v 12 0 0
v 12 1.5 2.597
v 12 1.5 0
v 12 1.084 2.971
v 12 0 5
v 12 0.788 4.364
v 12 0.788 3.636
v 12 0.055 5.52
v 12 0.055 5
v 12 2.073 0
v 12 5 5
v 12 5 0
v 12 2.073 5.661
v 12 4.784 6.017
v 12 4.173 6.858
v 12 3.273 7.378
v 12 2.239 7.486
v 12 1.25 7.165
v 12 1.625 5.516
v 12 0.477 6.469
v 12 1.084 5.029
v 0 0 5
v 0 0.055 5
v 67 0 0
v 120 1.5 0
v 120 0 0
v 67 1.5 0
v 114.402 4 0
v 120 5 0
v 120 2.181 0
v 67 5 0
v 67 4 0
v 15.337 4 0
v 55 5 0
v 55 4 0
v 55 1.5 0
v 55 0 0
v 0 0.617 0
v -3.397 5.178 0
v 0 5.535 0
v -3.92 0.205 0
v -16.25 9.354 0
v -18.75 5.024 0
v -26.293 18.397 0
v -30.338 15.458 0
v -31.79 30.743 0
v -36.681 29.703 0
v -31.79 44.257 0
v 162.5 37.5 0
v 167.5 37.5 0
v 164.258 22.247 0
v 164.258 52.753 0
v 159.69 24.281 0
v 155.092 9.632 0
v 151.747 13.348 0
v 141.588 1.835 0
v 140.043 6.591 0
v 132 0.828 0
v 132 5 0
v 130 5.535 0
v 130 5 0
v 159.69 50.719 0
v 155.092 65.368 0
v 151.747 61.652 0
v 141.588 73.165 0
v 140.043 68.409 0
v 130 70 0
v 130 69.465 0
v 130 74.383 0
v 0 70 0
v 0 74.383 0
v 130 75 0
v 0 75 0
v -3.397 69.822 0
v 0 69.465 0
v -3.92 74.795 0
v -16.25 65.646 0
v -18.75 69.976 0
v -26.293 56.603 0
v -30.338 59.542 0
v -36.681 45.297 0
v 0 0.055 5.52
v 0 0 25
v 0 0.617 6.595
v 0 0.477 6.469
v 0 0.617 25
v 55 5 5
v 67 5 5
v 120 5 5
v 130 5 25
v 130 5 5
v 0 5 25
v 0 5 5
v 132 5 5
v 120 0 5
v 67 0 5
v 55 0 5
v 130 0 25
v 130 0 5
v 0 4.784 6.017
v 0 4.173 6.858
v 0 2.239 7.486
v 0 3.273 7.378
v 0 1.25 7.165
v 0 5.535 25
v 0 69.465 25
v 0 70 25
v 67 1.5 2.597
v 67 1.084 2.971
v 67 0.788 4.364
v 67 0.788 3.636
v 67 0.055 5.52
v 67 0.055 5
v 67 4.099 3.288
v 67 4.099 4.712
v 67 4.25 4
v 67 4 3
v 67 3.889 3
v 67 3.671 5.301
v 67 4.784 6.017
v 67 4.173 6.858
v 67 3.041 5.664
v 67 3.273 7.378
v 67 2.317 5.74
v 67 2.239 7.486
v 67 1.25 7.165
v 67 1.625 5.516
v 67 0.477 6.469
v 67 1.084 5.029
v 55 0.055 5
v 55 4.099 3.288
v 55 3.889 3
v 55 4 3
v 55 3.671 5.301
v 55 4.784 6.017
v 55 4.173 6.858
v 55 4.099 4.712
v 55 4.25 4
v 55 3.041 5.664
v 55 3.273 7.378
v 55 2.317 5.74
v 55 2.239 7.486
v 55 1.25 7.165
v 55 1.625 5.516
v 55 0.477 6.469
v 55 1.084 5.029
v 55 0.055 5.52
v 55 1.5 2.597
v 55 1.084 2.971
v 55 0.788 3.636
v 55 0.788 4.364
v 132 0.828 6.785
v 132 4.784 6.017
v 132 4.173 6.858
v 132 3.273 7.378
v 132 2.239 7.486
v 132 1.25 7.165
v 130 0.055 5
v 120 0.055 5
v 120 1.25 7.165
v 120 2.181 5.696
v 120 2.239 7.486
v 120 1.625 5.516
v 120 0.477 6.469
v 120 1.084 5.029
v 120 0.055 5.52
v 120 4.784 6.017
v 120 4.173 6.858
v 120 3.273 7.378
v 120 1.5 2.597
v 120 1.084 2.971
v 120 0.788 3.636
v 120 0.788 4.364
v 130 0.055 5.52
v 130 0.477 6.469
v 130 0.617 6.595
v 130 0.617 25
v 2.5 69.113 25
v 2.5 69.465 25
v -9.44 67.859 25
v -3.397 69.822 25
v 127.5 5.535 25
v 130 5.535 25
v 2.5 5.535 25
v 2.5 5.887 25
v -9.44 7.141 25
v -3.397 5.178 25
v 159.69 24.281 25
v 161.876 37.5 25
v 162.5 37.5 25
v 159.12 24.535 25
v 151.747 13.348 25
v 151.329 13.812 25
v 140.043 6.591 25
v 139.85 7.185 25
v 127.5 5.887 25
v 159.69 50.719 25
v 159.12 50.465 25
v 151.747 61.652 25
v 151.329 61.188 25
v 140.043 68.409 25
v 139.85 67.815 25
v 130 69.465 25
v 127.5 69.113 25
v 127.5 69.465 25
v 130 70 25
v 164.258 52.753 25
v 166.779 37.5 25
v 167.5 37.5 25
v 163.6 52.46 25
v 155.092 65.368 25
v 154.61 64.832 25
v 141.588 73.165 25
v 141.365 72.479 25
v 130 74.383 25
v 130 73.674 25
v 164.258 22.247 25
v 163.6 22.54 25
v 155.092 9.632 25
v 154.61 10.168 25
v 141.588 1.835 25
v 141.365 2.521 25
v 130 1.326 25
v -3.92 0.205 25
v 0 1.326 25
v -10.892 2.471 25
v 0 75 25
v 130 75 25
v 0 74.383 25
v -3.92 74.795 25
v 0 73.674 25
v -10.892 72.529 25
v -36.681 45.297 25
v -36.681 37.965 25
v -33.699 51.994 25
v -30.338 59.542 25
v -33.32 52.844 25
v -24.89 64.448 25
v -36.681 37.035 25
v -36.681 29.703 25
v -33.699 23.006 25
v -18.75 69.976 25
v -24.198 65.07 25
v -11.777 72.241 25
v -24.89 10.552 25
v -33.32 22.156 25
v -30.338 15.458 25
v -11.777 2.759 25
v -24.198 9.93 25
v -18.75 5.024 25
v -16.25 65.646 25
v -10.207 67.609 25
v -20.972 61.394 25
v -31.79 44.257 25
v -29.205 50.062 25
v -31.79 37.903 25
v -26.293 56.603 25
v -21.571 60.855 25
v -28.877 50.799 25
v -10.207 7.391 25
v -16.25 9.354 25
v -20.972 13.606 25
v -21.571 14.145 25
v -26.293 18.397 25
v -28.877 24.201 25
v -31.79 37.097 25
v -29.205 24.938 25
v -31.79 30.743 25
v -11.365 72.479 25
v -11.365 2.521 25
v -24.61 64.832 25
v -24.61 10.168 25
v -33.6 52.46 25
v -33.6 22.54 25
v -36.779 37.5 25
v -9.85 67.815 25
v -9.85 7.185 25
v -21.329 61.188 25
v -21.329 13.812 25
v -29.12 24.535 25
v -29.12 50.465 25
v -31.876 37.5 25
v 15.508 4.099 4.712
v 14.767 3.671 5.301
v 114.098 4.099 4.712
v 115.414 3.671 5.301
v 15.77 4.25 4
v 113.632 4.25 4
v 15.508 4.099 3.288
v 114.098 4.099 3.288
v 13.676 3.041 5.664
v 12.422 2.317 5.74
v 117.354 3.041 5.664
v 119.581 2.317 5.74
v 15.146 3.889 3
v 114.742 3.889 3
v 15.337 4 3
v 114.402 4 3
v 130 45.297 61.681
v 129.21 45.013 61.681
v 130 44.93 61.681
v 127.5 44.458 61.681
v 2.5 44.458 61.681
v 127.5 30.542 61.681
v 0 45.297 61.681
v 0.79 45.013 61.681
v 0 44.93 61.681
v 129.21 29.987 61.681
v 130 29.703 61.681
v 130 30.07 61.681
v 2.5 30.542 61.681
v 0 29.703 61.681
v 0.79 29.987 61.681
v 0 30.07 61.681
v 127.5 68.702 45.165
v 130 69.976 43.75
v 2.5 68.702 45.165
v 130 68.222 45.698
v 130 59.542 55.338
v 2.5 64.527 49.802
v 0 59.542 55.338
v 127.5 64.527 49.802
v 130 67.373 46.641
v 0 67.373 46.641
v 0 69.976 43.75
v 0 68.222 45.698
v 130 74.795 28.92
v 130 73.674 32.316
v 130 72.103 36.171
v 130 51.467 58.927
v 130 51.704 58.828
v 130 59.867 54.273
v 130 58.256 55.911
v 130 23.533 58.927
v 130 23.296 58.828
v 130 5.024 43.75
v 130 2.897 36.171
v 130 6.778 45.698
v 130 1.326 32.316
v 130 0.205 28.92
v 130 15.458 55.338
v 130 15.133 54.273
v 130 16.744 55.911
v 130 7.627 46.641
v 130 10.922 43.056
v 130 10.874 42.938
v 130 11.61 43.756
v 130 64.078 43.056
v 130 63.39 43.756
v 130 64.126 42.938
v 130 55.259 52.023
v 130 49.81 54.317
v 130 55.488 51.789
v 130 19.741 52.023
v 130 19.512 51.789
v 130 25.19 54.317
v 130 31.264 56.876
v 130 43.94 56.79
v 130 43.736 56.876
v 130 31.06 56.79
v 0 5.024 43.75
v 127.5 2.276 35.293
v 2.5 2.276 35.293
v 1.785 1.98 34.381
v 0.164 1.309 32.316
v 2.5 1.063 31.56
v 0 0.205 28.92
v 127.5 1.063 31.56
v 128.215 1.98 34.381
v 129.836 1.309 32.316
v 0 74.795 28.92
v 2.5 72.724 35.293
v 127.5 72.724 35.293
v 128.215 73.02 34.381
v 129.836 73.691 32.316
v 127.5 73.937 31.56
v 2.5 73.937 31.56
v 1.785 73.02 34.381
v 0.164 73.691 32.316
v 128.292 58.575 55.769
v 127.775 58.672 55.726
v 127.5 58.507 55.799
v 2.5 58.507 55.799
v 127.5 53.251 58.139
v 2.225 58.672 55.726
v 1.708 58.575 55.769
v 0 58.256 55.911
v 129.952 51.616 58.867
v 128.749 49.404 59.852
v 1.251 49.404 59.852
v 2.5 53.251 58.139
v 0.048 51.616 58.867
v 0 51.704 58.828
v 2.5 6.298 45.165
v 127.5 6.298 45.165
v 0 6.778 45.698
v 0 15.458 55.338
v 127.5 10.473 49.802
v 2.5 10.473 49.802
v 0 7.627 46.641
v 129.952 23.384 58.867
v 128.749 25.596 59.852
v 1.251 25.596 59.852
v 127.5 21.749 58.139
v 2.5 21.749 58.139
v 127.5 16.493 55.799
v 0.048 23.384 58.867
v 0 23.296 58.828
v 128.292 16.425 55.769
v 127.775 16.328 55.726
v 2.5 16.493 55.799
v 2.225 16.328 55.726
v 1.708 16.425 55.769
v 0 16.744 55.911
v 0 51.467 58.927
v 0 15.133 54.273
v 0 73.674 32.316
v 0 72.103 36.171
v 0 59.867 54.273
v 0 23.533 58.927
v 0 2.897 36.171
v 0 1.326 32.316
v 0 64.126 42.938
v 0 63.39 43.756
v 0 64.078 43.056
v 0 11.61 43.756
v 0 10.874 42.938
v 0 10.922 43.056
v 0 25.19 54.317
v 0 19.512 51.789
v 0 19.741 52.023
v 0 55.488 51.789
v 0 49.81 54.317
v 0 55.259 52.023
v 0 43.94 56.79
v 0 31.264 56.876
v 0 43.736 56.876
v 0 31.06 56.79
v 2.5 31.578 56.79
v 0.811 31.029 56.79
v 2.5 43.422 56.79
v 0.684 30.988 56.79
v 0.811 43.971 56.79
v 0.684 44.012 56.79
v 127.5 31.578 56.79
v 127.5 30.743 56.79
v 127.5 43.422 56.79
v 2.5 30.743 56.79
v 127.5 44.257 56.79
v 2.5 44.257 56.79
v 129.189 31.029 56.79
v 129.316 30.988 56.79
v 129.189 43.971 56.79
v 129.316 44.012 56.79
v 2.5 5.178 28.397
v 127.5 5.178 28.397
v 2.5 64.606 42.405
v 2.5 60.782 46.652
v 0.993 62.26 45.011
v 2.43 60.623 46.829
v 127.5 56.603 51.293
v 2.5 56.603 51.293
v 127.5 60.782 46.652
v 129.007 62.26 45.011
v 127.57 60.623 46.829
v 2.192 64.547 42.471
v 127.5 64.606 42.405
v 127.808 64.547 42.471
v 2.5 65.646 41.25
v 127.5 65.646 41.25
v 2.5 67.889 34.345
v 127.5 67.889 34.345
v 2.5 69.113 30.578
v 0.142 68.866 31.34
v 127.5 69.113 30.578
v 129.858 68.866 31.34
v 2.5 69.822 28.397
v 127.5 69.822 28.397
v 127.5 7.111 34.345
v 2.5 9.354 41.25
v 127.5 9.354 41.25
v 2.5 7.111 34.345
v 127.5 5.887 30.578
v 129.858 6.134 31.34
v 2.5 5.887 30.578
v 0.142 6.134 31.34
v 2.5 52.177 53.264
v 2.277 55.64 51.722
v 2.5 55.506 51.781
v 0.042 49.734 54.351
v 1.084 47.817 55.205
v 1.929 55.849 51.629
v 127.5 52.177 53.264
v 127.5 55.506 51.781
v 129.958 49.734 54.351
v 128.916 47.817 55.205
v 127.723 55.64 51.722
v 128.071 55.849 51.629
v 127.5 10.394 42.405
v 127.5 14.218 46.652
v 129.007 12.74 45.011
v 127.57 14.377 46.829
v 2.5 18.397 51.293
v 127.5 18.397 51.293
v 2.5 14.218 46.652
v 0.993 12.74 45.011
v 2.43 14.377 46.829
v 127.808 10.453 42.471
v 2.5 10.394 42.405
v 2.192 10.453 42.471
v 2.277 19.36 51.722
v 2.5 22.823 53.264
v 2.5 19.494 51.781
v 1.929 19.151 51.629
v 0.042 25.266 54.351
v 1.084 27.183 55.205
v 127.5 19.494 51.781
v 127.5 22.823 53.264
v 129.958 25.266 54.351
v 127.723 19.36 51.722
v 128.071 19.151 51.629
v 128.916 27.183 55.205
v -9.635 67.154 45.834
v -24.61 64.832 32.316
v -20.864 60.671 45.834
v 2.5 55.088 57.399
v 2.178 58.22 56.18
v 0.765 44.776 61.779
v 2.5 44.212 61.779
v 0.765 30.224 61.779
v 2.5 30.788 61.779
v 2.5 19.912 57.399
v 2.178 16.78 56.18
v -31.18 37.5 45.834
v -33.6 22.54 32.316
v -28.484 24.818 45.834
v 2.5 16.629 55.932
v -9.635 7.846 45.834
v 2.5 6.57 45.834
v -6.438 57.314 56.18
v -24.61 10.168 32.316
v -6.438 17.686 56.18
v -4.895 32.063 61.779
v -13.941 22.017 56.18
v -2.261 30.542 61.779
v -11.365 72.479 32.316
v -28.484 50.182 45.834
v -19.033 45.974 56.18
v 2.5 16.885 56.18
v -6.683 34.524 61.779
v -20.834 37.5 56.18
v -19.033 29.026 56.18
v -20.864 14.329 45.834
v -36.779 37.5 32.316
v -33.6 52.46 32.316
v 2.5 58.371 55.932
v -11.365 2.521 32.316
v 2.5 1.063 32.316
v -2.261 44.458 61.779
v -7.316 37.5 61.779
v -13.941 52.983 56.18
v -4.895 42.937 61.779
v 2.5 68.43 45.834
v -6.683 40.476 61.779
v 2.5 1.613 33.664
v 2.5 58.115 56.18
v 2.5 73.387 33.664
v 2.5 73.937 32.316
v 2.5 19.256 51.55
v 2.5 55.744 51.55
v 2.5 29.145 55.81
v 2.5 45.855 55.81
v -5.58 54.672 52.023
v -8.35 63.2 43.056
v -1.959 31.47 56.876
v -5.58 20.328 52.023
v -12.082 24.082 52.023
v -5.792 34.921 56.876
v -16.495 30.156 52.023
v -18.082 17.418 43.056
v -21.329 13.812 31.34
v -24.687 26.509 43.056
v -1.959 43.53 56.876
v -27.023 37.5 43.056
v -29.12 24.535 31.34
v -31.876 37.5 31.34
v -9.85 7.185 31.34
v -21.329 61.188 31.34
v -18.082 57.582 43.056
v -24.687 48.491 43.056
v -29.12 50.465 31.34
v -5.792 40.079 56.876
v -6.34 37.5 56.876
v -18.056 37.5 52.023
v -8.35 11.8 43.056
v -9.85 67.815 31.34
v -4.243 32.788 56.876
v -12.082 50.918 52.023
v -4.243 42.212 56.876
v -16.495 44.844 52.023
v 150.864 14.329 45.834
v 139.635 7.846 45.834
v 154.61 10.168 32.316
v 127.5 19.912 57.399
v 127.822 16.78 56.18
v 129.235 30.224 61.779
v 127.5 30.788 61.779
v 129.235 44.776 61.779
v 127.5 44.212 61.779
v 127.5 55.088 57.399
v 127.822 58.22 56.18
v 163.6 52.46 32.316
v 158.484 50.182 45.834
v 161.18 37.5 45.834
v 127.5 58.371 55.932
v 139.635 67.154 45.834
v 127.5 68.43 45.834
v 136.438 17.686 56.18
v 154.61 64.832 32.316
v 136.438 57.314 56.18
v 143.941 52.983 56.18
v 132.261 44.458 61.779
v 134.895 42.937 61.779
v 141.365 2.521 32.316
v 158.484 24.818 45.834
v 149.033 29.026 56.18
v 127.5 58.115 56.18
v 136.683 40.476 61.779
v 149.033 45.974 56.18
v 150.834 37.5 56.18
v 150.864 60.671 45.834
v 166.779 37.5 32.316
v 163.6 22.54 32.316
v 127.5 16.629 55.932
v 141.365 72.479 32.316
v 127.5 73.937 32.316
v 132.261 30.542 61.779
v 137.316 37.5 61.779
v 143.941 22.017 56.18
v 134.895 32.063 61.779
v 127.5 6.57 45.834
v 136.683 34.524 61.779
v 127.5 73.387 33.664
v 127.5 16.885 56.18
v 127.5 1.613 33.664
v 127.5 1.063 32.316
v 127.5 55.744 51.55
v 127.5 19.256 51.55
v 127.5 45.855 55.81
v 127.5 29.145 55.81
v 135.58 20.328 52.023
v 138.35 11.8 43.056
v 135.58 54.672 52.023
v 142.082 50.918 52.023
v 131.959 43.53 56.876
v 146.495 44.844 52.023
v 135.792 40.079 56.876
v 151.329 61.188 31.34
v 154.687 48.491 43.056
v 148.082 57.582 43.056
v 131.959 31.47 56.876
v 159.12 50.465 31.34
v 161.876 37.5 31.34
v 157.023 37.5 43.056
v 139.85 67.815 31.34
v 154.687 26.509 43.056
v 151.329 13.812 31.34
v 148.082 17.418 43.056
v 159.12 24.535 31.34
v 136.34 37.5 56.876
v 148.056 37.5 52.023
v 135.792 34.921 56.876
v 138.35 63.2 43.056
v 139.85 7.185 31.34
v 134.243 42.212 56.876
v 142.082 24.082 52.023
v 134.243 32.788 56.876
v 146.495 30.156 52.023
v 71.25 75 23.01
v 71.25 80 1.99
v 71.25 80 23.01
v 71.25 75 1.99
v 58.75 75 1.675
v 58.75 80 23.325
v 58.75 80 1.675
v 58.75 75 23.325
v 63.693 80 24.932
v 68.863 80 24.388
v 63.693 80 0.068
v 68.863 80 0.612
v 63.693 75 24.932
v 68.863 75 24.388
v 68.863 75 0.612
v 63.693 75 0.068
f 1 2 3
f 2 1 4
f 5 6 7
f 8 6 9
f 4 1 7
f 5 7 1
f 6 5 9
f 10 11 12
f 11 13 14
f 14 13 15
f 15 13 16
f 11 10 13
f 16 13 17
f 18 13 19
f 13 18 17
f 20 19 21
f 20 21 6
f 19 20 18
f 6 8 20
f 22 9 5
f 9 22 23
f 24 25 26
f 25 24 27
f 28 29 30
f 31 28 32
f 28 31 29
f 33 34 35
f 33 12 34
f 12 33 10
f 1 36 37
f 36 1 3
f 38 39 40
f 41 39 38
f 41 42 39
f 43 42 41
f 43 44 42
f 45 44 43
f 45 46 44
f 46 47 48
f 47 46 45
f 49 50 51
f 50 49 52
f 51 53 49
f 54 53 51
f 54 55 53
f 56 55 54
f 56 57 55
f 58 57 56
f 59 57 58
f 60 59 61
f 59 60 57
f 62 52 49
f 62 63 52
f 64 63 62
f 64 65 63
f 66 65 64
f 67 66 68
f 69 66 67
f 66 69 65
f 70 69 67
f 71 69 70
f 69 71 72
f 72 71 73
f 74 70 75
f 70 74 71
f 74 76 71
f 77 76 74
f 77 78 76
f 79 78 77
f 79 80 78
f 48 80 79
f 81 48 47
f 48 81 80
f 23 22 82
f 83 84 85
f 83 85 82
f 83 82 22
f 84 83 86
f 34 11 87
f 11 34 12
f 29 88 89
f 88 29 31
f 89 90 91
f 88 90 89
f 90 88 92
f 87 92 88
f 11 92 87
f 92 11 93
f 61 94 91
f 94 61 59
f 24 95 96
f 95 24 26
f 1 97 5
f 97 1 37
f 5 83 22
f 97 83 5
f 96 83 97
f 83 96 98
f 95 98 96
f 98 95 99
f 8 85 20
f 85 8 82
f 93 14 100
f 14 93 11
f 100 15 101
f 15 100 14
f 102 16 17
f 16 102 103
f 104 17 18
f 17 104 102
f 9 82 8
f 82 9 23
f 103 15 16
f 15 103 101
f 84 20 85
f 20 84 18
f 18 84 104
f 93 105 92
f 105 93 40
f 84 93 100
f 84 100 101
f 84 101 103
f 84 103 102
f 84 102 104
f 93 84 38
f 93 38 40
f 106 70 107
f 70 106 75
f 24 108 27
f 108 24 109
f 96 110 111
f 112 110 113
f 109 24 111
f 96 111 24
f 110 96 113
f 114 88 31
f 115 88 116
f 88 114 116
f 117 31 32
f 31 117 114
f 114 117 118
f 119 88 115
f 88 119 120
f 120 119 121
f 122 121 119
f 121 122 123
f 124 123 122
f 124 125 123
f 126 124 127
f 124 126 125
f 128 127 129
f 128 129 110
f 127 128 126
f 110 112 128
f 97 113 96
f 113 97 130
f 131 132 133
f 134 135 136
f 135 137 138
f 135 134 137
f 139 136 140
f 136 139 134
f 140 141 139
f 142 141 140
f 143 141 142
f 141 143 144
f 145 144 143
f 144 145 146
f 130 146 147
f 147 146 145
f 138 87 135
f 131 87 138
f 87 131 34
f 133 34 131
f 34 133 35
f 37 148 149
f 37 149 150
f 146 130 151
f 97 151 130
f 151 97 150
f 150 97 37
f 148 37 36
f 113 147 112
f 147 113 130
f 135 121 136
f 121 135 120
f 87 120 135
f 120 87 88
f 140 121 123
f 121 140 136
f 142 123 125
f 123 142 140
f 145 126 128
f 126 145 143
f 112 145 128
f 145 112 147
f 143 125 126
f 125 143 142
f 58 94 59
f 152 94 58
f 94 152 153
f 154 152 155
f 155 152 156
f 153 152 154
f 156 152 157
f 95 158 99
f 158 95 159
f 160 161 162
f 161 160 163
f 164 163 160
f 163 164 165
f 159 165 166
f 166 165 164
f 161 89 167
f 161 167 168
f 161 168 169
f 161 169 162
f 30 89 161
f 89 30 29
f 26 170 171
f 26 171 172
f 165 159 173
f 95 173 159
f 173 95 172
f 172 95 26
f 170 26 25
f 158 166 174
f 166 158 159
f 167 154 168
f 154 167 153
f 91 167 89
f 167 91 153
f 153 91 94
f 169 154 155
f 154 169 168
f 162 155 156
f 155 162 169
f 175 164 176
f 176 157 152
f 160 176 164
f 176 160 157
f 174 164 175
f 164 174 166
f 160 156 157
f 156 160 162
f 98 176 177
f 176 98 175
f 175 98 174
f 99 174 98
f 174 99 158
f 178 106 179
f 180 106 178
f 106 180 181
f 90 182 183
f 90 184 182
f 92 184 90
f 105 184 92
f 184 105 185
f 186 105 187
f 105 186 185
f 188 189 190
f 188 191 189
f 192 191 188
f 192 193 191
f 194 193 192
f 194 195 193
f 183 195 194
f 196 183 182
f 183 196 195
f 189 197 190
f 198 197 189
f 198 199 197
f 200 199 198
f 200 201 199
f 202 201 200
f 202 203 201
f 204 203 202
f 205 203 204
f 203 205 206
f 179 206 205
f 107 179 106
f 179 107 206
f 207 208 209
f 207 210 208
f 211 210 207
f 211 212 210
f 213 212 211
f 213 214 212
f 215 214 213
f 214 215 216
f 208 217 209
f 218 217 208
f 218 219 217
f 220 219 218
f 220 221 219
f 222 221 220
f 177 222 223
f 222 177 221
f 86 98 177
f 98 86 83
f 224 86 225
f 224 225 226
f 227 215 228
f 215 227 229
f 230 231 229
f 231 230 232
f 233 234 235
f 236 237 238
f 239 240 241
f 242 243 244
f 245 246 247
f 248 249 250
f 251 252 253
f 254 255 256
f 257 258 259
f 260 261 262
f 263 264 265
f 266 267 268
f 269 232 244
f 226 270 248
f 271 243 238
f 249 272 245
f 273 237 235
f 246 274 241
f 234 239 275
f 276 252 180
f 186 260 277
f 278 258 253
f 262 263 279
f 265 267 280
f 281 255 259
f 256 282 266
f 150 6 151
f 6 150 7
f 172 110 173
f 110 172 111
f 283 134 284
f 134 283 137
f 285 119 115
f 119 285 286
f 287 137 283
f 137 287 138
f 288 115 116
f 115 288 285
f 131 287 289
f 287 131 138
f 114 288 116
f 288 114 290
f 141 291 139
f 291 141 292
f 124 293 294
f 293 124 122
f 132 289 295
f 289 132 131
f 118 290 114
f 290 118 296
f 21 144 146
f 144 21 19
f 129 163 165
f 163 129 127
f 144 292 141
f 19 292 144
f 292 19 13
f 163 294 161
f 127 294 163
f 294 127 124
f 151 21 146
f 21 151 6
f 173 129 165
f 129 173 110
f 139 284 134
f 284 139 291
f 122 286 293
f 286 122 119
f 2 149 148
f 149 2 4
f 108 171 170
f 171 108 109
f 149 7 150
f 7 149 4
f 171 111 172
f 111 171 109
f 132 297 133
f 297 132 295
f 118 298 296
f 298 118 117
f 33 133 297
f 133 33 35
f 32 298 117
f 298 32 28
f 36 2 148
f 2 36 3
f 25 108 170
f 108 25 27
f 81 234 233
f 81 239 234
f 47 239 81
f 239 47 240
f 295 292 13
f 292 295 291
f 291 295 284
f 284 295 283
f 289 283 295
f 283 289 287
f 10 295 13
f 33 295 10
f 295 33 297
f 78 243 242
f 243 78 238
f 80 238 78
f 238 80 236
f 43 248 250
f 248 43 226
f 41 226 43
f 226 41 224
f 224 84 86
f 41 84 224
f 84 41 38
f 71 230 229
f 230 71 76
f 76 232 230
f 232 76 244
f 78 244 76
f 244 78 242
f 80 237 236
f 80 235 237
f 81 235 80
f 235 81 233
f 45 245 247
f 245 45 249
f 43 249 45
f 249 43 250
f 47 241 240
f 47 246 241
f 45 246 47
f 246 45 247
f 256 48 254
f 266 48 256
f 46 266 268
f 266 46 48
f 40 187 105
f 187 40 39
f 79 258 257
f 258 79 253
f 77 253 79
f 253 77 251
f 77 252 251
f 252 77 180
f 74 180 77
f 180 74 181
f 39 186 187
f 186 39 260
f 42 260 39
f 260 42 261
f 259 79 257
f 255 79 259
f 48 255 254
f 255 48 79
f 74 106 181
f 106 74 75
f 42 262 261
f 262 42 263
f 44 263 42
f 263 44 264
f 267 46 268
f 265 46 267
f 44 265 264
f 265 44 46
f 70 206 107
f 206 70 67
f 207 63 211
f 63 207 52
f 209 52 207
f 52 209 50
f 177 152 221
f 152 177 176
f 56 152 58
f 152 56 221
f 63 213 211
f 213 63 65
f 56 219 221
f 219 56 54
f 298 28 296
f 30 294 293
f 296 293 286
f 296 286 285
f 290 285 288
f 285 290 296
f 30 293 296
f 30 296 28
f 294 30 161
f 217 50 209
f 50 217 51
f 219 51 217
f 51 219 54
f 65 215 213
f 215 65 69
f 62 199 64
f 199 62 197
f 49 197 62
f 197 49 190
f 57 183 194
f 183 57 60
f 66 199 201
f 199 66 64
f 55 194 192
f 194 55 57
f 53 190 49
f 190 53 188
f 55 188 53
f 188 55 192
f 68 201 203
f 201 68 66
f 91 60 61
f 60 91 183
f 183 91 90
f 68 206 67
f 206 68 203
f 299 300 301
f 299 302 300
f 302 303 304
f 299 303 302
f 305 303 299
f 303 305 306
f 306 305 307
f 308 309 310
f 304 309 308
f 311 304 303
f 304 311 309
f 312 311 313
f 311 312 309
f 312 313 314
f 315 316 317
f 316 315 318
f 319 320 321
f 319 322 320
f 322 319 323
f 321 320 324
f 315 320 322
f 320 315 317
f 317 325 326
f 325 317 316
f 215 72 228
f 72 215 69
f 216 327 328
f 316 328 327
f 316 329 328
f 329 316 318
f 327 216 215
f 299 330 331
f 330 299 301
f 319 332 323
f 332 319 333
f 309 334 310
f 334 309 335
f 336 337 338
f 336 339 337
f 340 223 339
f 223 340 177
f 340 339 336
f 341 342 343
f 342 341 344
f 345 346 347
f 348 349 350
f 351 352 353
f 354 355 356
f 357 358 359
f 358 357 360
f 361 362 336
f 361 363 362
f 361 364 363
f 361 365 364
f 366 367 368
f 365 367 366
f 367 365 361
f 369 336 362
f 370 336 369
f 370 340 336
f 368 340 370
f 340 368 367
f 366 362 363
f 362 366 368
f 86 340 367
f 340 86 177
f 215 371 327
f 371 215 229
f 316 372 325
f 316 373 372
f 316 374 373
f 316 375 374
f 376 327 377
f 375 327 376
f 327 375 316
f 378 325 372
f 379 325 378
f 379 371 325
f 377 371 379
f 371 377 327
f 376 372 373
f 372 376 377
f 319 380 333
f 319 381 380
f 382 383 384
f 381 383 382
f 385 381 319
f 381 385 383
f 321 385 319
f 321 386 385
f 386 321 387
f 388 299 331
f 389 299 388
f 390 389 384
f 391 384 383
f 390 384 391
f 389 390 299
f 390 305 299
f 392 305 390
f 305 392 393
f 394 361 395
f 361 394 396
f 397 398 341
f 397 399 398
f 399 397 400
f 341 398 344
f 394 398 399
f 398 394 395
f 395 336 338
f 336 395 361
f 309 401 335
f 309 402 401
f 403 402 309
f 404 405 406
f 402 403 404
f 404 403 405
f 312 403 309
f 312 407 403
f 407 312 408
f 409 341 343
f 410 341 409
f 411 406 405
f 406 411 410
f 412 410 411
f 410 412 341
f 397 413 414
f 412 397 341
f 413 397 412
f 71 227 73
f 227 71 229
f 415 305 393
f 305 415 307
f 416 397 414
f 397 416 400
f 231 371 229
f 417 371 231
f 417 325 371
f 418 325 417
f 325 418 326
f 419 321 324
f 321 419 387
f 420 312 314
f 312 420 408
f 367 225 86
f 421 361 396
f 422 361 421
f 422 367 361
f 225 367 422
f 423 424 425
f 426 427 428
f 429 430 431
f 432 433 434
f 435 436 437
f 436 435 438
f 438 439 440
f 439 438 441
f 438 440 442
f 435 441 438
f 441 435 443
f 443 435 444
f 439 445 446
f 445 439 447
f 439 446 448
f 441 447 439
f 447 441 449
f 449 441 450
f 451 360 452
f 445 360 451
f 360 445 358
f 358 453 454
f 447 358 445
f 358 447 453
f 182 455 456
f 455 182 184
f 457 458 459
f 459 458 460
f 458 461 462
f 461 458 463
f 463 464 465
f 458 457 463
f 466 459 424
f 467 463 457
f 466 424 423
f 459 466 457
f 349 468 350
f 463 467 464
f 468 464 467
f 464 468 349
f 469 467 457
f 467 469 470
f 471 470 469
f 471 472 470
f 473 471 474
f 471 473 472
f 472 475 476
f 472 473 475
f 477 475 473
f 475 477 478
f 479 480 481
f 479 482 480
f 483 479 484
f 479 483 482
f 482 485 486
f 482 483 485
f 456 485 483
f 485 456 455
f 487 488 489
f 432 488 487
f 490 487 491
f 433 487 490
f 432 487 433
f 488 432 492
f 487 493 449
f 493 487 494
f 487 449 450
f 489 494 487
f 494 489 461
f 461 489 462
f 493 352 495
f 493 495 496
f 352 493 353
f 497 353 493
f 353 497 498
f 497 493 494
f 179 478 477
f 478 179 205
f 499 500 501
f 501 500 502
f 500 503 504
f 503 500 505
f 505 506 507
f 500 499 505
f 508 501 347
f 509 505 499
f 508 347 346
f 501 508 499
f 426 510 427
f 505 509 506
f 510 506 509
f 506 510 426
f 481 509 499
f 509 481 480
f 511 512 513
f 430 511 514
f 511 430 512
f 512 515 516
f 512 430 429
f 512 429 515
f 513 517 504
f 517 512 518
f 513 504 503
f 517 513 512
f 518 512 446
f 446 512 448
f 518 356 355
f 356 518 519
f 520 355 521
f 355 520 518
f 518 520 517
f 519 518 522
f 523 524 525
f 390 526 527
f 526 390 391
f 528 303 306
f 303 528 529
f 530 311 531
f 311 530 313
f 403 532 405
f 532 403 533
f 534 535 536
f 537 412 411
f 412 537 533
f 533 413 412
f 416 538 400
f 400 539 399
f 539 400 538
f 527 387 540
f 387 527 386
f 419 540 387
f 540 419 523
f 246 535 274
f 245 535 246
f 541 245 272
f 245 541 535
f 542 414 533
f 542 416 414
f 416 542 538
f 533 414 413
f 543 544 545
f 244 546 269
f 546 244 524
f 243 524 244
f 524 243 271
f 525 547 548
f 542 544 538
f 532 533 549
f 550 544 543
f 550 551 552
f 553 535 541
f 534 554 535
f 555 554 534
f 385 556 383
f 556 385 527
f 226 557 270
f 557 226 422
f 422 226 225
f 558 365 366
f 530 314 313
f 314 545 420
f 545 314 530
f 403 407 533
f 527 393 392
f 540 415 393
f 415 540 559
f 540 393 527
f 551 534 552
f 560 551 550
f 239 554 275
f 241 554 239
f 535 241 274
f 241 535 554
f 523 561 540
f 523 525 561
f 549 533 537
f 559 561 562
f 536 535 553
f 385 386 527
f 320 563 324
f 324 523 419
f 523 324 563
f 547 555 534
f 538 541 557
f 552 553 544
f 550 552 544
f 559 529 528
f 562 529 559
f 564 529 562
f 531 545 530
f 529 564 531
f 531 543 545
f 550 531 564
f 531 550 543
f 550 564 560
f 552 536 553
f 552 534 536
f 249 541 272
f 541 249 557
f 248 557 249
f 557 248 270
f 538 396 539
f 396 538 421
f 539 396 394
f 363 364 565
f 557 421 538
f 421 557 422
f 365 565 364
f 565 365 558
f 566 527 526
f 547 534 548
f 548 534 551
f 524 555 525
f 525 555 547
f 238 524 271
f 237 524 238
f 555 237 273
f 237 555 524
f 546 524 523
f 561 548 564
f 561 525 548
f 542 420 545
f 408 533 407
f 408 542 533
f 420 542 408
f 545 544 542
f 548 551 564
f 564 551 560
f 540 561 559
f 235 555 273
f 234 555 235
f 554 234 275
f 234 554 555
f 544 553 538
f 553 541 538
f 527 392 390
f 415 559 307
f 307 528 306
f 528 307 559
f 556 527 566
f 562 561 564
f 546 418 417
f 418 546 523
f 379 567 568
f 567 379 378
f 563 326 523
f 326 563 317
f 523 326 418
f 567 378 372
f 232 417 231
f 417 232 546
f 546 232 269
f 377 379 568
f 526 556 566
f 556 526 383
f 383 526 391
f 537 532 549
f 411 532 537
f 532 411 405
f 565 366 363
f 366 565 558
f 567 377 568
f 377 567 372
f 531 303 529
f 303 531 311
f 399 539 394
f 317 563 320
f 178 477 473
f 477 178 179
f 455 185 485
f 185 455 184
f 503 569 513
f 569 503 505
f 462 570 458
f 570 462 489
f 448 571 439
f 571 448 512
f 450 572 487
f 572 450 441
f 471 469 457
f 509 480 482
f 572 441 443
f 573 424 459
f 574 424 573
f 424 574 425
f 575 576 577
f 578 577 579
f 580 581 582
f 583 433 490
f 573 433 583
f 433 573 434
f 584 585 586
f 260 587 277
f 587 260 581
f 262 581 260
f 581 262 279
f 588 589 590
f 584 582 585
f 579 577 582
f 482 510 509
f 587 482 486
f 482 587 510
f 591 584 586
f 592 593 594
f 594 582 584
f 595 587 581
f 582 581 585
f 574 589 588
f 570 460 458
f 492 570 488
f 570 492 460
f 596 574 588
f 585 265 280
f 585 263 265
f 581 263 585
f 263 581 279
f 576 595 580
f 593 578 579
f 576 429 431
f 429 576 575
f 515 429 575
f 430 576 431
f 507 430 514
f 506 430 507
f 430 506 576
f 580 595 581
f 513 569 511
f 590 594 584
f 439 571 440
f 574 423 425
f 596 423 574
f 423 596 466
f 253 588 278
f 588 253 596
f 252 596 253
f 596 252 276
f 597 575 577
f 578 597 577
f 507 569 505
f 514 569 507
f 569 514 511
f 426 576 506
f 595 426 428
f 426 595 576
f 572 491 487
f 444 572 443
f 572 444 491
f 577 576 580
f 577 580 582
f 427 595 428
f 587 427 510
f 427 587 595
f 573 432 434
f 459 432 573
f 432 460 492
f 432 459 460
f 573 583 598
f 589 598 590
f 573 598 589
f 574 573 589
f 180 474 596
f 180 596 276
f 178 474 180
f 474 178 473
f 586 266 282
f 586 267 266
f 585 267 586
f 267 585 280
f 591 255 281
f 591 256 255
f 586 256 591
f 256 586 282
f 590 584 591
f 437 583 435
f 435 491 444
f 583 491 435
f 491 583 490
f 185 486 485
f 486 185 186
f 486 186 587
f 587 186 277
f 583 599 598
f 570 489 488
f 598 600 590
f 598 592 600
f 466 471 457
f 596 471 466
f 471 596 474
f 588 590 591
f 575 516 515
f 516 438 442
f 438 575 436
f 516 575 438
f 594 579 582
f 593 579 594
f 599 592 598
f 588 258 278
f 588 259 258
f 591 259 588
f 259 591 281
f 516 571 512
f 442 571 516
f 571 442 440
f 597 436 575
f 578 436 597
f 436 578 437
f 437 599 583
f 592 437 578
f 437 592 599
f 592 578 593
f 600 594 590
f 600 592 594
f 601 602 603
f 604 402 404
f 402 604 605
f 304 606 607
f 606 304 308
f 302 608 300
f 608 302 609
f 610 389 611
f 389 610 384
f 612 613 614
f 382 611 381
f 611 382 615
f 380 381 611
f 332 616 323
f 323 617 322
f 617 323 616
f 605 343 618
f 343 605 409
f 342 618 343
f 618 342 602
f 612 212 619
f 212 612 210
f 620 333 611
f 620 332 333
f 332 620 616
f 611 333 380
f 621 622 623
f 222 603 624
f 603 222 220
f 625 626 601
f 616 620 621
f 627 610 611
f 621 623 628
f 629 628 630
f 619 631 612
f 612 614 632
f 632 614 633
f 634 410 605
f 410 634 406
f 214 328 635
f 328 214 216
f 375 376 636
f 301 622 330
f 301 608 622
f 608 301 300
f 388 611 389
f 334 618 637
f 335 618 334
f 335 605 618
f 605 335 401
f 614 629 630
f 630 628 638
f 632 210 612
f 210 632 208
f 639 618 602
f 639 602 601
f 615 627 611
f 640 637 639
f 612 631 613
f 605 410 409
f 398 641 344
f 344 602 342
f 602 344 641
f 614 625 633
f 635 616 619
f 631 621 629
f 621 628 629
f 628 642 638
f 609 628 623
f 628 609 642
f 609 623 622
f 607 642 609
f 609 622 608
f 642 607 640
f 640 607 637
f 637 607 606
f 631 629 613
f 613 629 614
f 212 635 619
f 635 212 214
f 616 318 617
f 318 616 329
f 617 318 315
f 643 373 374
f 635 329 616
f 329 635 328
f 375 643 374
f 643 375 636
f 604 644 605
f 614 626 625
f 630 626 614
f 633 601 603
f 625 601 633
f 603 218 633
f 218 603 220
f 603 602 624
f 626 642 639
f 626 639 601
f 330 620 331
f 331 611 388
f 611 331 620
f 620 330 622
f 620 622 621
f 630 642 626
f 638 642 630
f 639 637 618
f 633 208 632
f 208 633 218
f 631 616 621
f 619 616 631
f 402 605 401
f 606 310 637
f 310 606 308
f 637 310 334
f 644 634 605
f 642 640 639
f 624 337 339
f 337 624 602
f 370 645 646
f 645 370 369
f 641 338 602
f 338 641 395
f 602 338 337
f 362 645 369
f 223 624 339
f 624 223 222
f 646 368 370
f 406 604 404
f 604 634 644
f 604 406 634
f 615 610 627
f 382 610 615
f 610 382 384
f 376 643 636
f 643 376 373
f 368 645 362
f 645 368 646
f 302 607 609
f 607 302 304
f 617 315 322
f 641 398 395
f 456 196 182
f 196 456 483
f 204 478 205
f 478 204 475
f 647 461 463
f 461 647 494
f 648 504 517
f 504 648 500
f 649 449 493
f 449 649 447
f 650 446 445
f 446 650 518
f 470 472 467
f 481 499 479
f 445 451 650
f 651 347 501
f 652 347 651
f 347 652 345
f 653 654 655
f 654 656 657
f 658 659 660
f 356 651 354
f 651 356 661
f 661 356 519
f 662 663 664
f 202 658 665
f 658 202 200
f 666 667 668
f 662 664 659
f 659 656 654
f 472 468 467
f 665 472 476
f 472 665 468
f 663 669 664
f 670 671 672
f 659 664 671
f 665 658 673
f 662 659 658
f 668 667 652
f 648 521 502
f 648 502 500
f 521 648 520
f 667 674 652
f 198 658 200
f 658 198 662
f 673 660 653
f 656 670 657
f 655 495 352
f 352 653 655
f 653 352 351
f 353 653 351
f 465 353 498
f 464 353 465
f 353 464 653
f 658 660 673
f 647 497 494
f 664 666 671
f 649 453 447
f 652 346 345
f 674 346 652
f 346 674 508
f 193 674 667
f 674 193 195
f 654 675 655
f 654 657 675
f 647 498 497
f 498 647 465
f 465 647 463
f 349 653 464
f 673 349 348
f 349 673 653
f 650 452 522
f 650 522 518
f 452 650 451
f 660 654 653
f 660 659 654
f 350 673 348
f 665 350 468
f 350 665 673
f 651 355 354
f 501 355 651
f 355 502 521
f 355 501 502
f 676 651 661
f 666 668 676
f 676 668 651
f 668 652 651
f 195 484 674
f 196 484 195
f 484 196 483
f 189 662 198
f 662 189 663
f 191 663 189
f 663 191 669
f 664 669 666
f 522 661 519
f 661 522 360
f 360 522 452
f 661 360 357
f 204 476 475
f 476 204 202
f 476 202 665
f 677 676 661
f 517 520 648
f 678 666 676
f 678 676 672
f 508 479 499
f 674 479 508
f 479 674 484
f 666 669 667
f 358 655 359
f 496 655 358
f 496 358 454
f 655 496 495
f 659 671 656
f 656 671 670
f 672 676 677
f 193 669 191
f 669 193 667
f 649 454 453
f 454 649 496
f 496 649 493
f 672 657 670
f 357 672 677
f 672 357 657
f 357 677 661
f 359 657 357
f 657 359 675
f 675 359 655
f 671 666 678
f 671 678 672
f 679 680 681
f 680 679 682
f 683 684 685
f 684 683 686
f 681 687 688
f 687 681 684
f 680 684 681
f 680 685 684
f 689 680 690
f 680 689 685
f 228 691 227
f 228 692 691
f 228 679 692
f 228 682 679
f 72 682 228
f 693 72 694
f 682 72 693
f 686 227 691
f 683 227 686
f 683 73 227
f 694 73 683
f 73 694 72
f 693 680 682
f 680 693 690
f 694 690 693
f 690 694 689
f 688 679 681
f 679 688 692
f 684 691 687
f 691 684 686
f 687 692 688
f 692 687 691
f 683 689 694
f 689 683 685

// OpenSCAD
$fn=15;

//The variables hcoffre, lcoffrex,lcoffrey and llamey represent in the same order: 1) the height of the object 2) the lenght of the object 3) the width of the object 4) the thickness of the object. All values can be changed but it is recommended not to change the "llamey" value for the fonctionnality of the object. For this part, it is recommended to use 1/2 of the "hcoffre" value than the one used for the base.

hcoffre= 25;
lcoffrex= 130;
llamey= 5;
lcoffrey=70;


module head(coffrex,coffrey,coffrez){

//the first part of text represents the head's sides (base) of the pencil case

	difference(){union(){difference(){cube([coffrex,llamey,coffrez]) ;
union(){union() {translate([0,0,0])cube([llamey+llamey+2,llamey,5]) ;

rotate([90,0,90])translate([llamey/2,llamey,0])cylinder(h=llamey+llamey+2,r=llamey/2) ;}

translate([lcoffrex/2-10,0,0])union() {translate([0,0,0])cube([llamey+llamey+2,llamey,5]) ;

rotate([90,0,90])translate([llamey/2,llamey,0])cylinder(h=llamey+llamey+2,r=llamey/2) ;}

translate([lcoffrex-10,0,0])union() {translate([0,0,0])cube([llamey+llamey+2,llamey,5]) ;

rotate([90,0,90])translate([llamey/2,llamey,0])cylinder(h=12,r=llamey/2) ;}}}}translate([0,llamey/2,4])rotate([90,0,90])cylinder(h=lcoffrex,r=llamey/4+0.5);translate([0,1.5,0])cube([lcoffrex,2.5,3]);}

translate([0,lcoffrey,0])cube([coffrex,llamey,coffrez]) ;

//the second part of the codes represents the cover of the pencil case

difference(){	union(){difference(){translate([0,lcoffrey/2+llamey/2,0])cylinder(h=hcoffre,r=lcoffrey/2+llamey/2);
translate([0,lcoffrey/2+llamey/2,0])cylinder(h=hcoffre,r=lcoffrey/2-llamey/2) ;translate([0,llamey,0])cube([lcoffrex/2,lcoffrey-llamey,hcoffre]); }}union() {translate([0,0,0])cube([llamey+llamey+2,llamey,5]) ;

rotate([90,0,90])translate([llamey/2,llamey,0])cylinder(h=llamey+llamey+2,r=llamey/2) ;}}

difference(){	union(){difference(){translate([lcoffrex,lcoffrey/2+llamey/2,0])cylinder(h=hcoffre,r=lcoffrey/2+llamey/2) ;
translate([lcoffrex,lcoffrey/2+llamey/2,0])cylinder(h=hcoffre,r=lcoffrey/2-llamey/2) ;translate([lcoffrex/2,llamey,0])cube([lcoffrex/2,lcoffrey-llamey,hcoffre]); }}union(){translate([lcoffrex-10,0,0])union() {translate([0,0,0])cube([llamey+llamey+2,llamey,5]);

rotate([90,0,90])translate([llamey/2,llamey,0])cylinder(h=llamey+llamey+2,r=llamey/2) ;}}}

translate([0,lcoffrey/2+llamey/2,hcoffre])rotate([0,90,0])difference(){cylinder(h=lcoffrex,r=lcoffrey/2+llamey/2);cylinder(h=lcoffrex,r=lcoffrey/2-llamey/2);translate([0,-lcoffrey/2+llamey/2,0])cube([lcoffrey/2+5,lcoffrey-llamey,lcoffrex]);}

translate([llamey/2,0,hcoffre])translate([0,lcoffrey+llamey])rotate([0,0,180])translate([-lcoffrey/2,0,-lcoffrey])difference(){translate([lcoffrey/2+llamey/2,lcoffrey/2+llamey/2,lcoffrey])sphere(d=lcoffrey+llamey);cube([lcoffrey+llamey,lcoffrey+llamey,lcoffrey]);cube([lcoffrey/2,lcoffrey+llamey,lcoffrey+lcoffrey/2+llamey]);translate([lcoffrey/2+llamey/2,lcoffrey/2+llamey/2,lcoffrey])sphere(d=lcoffrey-llamey);}

translate([lcoffrex-llamey/2,0,hcoffre])translate([-lcoffrey/2,0,-lcoffrey])difference(){translate([lcoffrey/2+llamey/2,lcoffrey/2+llamey/2,lcoffrey])sphere(d=lcoffrey+llamey);cube([lcoffrey+llamey,lcoffrey+llamey,lcoffrey]);cube([lcoffrey/2,lcoffrey+llamey,lcoffrey+lcoffrey/2+llamey]);translate([lcoffrey/2+llamey/2,lcoffrey/2+llamey/2,lcoffrey])sphere(d=lcoffrey-llamey);}

//the last part of the code represent the badge in front of the pencil case for the chest aesthetics

intersection(){translate([lcoffrex/2-hcoffre/4,lcoffrey+llamey,0])cube([hcoffre/2,llamey,hcoffre]);
translate([lcoffrex/2,lcoffrey+llamey+llamey,hcoffre/2])rotate([90,0,0])cylinder(h=llamey,r=hcoffre/2);}
}

translate([0,0,0])head(lcoffrex,lcoffrey,hcoffre);
